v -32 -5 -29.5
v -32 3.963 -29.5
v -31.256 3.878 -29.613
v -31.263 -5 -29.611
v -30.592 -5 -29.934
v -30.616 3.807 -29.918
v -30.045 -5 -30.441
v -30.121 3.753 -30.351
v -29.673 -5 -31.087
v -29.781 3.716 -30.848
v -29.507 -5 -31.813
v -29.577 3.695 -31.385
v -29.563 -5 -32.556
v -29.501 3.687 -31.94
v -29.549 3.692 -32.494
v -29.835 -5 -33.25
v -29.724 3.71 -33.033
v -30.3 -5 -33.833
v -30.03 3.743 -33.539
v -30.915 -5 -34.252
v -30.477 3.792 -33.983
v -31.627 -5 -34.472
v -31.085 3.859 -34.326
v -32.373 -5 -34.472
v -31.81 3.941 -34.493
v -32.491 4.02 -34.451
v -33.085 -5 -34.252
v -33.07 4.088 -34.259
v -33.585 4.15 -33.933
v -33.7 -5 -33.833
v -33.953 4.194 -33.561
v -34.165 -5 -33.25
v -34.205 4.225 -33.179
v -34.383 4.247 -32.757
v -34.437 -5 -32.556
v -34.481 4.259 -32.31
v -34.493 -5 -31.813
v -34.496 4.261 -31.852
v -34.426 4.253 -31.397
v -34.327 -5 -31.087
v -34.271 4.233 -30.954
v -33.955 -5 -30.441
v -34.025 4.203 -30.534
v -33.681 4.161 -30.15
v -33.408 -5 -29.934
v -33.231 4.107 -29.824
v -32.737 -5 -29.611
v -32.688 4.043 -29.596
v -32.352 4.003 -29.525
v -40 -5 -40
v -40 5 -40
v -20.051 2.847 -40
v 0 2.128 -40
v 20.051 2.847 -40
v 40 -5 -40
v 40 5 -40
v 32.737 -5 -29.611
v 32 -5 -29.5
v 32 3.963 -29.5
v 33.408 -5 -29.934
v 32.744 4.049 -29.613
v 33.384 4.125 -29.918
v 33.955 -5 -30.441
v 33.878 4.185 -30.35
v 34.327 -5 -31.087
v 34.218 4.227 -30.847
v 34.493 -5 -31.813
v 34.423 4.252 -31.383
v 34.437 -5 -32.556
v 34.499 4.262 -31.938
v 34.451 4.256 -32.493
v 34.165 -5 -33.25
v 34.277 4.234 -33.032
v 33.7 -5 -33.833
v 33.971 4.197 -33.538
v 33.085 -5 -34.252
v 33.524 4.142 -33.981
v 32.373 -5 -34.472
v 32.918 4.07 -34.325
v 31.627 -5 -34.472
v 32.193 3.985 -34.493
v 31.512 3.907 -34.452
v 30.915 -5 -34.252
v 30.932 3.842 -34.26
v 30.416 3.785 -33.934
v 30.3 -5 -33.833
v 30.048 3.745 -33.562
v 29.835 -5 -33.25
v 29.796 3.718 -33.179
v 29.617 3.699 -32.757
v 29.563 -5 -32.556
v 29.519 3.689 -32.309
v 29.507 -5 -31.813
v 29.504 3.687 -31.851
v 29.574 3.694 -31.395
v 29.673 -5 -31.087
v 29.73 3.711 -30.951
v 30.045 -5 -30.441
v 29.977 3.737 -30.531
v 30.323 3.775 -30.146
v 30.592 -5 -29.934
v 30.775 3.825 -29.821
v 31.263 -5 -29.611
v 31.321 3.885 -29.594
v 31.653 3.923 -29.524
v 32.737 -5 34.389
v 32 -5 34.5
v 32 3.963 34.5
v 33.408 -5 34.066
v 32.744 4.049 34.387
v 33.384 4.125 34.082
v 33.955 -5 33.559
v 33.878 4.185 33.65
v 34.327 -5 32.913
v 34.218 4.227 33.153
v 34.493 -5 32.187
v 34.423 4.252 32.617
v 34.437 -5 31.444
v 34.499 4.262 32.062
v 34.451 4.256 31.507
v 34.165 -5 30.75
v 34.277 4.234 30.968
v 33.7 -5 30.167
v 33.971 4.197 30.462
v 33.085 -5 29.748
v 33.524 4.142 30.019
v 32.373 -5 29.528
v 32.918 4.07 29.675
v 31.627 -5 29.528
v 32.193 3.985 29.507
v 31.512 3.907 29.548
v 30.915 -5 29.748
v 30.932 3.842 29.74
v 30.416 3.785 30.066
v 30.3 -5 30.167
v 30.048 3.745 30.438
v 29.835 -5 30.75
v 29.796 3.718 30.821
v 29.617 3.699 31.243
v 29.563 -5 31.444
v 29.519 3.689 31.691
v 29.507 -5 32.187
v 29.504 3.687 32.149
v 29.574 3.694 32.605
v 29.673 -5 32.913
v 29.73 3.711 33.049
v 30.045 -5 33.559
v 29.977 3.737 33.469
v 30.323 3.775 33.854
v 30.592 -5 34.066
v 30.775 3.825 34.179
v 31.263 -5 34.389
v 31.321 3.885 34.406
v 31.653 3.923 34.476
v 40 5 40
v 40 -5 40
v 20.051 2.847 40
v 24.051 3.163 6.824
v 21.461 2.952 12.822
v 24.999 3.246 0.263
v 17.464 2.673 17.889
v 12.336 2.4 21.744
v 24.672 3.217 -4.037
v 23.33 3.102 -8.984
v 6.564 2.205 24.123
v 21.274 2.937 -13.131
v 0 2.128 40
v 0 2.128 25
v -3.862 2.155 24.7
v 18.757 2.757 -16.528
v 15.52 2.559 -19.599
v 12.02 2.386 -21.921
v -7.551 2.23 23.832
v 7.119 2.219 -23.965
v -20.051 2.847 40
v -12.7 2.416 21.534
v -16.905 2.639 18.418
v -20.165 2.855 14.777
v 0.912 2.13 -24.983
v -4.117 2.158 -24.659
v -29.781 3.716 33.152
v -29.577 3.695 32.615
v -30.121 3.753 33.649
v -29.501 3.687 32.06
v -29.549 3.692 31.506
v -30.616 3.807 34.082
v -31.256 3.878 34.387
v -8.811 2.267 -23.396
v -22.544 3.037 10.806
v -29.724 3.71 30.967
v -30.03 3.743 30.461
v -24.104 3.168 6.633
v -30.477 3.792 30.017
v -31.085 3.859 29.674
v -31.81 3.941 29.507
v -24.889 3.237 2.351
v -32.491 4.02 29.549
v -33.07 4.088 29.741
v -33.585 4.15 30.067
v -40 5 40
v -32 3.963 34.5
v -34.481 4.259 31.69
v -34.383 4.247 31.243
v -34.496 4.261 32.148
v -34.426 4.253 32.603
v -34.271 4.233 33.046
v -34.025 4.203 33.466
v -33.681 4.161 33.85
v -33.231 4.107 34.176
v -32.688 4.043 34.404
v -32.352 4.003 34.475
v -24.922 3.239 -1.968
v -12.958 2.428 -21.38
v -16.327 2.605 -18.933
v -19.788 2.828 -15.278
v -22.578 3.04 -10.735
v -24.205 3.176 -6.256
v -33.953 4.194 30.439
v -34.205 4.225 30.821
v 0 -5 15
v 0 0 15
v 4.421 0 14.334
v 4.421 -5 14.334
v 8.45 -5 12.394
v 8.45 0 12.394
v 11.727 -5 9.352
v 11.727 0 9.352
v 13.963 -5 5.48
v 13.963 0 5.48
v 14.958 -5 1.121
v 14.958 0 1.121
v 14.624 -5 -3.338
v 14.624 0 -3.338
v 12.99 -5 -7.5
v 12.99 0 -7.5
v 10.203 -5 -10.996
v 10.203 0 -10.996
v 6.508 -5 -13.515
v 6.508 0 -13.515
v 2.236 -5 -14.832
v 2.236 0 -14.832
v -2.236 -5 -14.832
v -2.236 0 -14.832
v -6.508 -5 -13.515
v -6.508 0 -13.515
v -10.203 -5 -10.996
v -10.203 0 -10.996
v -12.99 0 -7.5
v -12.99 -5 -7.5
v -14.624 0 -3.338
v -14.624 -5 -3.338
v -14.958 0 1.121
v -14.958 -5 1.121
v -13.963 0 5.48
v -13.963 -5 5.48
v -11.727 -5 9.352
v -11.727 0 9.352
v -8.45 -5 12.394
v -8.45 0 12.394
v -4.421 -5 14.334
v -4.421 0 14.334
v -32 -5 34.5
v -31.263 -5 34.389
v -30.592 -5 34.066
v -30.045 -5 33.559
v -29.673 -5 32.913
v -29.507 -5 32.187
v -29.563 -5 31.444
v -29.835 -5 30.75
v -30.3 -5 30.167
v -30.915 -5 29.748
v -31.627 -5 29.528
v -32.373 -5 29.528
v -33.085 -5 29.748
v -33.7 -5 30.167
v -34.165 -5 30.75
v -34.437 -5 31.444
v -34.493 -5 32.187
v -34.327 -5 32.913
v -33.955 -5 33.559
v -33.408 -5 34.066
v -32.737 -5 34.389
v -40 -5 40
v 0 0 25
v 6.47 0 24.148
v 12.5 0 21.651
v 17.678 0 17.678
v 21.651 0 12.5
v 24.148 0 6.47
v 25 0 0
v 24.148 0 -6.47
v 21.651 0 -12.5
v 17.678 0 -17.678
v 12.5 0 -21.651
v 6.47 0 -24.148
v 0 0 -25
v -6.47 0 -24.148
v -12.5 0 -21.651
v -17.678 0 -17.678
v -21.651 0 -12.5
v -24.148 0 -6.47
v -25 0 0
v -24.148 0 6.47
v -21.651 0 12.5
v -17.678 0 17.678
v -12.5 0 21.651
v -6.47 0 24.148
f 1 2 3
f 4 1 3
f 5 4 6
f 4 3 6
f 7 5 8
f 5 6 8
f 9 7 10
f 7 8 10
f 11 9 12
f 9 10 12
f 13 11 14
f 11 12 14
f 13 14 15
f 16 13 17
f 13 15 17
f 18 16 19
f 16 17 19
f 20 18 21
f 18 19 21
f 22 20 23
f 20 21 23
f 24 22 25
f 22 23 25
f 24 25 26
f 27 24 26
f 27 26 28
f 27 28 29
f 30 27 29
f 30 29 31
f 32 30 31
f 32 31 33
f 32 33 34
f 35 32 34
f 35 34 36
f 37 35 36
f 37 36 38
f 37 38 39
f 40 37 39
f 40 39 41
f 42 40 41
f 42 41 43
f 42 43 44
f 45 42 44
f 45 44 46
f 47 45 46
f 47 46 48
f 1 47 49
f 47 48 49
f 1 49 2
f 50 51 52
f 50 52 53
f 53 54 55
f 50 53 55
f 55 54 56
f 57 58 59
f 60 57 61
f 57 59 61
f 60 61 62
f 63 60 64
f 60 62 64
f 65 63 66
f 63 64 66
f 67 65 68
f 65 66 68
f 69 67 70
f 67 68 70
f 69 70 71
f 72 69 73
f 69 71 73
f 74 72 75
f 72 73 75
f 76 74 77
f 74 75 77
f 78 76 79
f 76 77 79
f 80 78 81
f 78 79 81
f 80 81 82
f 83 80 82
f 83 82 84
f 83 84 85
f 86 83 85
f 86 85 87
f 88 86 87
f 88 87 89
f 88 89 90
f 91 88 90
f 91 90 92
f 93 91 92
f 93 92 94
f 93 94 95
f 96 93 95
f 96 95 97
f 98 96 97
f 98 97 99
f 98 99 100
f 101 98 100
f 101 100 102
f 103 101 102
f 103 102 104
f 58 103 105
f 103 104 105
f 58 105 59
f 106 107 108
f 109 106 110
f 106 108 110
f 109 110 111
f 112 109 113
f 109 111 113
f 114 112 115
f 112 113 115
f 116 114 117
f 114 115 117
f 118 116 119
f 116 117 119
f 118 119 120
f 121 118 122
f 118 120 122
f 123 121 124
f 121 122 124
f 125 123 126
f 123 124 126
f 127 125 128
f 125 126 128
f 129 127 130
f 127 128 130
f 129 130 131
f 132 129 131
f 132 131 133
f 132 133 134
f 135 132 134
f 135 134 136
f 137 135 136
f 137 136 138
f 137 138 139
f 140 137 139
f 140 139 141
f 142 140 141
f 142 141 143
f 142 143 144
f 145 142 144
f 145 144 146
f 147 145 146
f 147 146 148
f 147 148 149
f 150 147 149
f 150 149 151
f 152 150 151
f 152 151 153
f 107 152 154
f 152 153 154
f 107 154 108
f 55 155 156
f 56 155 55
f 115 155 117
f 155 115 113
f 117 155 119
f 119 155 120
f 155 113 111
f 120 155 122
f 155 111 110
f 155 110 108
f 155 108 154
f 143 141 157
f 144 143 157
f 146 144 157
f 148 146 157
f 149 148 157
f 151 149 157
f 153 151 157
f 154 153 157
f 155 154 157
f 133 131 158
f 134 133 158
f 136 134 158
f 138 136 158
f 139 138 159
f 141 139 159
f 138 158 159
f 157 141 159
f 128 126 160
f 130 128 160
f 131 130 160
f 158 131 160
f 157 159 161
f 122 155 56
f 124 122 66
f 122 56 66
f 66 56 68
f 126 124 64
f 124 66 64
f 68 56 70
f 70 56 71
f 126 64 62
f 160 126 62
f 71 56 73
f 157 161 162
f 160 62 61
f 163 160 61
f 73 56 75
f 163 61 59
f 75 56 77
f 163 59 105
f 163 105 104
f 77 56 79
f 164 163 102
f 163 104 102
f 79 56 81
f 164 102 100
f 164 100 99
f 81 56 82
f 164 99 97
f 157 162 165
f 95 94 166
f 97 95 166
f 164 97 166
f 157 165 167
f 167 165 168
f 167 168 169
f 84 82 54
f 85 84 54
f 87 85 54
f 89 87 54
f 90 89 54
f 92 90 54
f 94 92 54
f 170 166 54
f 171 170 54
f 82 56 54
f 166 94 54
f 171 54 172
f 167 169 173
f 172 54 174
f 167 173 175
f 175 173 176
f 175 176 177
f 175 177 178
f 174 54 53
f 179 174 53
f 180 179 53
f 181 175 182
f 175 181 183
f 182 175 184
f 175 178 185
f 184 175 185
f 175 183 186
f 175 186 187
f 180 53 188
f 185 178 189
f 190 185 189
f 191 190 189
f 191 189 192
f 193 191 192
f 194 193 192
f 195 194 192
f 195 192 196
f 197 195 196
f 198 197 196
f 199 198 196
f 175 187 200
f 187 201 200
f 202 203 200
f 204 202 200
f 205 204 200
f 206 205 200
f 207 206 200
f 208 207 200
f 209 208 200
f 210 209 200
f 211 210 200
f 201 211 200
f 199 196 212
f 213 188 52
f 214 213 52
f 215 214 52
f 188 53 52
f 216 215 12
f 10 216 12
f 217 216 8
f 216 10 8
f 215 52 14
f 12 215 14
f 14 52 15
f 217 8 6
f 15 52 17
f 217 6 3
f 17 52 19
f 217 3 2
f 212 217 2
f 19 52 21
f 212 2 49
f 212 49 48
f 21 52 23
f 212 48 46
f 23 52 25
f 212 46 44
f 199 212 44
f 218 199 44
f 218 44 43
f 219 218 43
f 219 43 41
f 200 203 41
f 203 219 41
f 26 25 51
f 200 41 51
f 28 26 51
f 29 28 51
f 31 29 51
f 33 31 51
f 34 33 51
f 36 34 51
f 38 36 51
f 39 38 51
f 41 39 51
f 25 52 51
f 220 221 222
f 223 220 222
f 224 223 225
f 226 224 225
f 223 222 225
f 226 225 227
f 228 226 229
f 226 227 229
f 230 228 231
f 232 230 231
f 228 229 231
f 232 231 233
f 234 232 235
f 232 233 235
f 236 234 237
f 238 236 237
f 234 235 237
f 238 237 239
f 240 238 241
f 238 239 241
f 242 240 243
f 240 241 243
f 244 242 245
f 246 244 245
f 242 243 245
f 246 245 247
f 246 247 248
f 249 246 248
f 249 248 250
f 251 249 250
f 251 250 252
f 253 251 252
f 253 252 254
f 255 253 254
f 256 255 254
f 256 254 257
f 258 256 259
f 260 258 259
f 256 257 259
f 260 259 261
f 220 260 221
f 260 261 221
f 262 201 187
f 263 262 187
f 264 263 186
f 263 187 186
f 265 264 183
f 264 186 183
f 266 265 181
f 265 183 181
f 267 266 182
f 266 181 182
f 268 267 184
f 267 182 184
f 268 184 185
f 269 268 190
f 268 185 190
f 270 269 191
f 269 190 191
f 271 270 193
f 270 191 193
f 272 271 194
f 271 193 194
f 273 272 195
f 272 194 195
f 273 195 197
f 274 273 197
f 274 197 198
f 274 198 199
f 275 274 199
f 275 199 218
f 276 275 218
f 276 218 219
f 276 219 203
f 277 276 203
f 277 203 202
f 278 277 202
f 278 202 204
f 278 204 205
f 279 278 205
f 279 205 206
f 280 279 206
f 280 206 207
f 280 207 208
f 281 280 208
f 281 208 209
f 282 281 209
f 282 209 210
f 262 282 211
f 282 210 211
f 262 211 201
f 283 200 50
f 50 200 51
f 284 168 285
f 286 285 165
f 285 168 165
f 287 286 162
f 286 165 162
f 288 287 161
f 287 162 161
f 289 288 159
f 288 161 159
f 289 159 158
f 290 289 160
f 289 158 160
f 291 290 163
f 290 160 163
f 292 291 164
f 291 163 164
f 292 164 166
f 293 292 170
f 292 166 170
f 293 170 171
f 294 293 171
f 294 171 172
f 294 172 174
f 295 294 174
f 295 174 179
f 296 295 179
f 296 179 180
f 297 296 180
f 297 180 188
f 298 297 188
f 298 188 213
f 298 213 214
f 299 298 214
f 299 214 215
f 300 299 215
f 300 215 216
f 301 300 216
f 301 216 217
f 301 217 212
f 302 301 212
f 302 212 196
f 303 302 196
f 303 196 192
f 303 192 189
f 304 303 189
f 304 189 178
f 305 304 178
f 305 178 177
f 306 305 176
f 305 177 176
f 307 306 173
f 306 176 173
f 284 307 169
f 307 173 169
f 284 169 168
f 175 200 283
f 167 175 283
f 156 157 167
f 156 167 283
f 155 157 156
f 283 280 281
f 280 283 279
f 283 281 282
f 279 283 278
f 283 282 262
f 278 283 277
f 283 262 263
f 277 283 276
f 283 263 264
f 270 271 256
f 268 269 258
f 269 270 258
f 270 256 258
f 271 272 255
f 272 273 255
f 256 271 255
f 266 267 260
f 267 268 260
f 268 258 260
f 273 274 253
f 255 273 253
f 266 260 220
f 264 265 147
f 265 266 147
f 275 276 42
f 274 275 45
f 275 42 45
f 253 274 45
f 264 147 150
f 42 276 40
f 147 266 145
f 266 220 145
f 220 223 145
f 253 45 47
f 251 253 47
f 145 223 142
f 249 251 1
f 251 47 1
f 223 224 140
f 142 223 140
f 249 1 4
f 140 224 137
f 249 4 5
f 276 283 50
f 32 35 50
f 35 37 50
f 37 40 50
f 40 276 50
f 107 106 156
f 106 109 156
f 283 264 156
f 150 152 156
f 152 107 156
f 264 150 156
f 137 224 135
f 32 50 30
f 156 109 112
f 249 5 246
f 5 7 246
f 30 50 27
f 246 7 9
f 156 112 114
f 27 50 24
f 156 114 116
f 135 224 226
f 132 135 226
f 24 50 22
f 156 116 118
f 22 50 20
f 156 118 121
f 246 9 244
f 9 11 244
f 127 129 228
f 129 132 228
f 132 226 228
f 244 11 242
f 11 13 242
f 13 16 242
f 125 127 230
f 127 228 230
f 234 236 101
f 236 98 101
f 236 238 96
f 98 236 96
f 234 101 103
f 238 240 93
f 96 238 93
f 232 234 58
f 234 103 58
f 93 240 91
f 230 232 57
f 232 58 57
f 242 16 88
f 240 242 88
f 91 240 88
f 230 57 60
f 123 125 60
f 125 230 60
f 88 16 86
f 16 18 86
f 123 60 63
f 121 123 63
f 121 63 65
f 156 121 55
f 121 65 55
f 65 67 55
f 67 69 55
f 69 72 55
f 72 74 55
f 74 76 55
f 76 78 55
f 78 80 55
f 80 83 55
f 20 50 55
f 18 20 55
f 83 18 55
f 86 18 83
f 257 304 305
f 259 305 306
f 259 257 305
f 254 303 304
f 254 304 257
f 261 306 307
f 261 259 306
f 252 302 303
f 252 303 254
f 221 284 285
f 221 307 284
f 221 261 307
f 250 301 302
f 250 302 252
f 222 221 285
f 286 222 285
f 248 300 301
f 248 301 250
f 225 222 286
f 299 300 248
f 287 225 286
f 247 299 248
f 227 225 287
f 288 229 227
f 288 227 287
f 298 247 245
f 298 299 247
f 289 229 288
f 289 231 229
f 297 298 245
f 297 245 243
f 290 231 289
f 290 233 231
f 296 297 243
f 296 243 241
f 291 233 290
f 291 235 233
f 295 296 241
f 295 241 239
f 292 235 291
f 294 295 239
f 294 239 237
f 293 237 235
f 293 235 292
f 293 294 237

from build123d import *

# Parameters (mm, degrees)
SKETCH1_3_W         = 80
SKETCH1_3_H         = 80
SKETCH1_3_R         = 2.5
SKETCH1_3_R_2       = 15
BOSS_EXTRUDE3_DEPTH = 5
BOSS_EXTRUDE4_START = 5
SKETCH1_W           = 80
SKETCH1_H           = 80
SKETCH1_R           = 2.5
SKETCH1_R_2         = 25
BOSS_EXTRUDE4_DEPTH = 5
CUT_EXTRUDE1_DEPTH  = 90.582364336


with BuildPart() as part:
    # Sketch1<3> → Boss-Extrude3 (new body)
    with BuildSketch(Plane(origin=(0, 0, 0), x_dir=(1, 0, 0), z_dir=(0, 1, 0))):
        Rectangle(SKETCH1_3_W, SKETCH1_3_H)
        with Locations((-32, -32)):
            Circle(SKETCH1_3_R, mode=Mode.SUBTRACT)
        with Locations((32, -32)):
            Circle(SKETCH1_3_R, mode=Mode.SUBTRACT)
        with Locations((-32, 32)):
            Circle(SKETCH1_3_R, mode=Mode.SUBTRACT)
        with Locations((32, 32)):
            Circle(SKETCH1_3_R, mode=Mode.SUBTRACT)
        Circle(SKETCH1_3_R_2, mode=Mode.SUBTRACT)
    extrude(amount=-BOSS_EXTRUDE3_DEPTH)

    # Sketch1 → Boss-Extrude4 (add)
    with BuildSketch(Plane(origin=(0, 0, 0), x_dir=(1, 0, 0), z_dir=(0, 1, 0)).offset(BOSS_EXTRUDE4_START)):
        Rectangle(SKETCH1_W, SKETCH1_H)
        with Locations((-32, -32)):
            Circle(SKETCH1_R, mode=Mode.SUBTRACT)
        with Locations((32, -32)):
            Circle(SKETCH1_R, mode=Mode.SUBTRACT)
        Circle(SKETCH1_R_2, mode=Mode.SUBTRACT)
        with Locations((-32, 32)):
            Circle(SKETCH1_R, mode=Mode.SUBTRACT)
        with Locations((32, 32)):
            Circle(SKETCH1_R, mode=Mode.SUBTRACT)
    extrude(amount=-BOSS_EXTRUDE4_DEPTH)

    # Sketch5 → Cut-Extrude1 (cut, through all)
    with BuildSketch(Plane(origin=(0, 0, -40), x_dir=(-1, 0, 0), z_dir=(0, 0, -1))):
        with BuildLine():
            Line((40, 5), (-40, 5))
            ThreePointArc((-40, 5), (0, 2.128129211), (40, 5))
        make_face()
    extrude(amount=-CUT_EXTRUDE1_DEPTH, mode=Mode.SUBTRACT)


solid = part.part
